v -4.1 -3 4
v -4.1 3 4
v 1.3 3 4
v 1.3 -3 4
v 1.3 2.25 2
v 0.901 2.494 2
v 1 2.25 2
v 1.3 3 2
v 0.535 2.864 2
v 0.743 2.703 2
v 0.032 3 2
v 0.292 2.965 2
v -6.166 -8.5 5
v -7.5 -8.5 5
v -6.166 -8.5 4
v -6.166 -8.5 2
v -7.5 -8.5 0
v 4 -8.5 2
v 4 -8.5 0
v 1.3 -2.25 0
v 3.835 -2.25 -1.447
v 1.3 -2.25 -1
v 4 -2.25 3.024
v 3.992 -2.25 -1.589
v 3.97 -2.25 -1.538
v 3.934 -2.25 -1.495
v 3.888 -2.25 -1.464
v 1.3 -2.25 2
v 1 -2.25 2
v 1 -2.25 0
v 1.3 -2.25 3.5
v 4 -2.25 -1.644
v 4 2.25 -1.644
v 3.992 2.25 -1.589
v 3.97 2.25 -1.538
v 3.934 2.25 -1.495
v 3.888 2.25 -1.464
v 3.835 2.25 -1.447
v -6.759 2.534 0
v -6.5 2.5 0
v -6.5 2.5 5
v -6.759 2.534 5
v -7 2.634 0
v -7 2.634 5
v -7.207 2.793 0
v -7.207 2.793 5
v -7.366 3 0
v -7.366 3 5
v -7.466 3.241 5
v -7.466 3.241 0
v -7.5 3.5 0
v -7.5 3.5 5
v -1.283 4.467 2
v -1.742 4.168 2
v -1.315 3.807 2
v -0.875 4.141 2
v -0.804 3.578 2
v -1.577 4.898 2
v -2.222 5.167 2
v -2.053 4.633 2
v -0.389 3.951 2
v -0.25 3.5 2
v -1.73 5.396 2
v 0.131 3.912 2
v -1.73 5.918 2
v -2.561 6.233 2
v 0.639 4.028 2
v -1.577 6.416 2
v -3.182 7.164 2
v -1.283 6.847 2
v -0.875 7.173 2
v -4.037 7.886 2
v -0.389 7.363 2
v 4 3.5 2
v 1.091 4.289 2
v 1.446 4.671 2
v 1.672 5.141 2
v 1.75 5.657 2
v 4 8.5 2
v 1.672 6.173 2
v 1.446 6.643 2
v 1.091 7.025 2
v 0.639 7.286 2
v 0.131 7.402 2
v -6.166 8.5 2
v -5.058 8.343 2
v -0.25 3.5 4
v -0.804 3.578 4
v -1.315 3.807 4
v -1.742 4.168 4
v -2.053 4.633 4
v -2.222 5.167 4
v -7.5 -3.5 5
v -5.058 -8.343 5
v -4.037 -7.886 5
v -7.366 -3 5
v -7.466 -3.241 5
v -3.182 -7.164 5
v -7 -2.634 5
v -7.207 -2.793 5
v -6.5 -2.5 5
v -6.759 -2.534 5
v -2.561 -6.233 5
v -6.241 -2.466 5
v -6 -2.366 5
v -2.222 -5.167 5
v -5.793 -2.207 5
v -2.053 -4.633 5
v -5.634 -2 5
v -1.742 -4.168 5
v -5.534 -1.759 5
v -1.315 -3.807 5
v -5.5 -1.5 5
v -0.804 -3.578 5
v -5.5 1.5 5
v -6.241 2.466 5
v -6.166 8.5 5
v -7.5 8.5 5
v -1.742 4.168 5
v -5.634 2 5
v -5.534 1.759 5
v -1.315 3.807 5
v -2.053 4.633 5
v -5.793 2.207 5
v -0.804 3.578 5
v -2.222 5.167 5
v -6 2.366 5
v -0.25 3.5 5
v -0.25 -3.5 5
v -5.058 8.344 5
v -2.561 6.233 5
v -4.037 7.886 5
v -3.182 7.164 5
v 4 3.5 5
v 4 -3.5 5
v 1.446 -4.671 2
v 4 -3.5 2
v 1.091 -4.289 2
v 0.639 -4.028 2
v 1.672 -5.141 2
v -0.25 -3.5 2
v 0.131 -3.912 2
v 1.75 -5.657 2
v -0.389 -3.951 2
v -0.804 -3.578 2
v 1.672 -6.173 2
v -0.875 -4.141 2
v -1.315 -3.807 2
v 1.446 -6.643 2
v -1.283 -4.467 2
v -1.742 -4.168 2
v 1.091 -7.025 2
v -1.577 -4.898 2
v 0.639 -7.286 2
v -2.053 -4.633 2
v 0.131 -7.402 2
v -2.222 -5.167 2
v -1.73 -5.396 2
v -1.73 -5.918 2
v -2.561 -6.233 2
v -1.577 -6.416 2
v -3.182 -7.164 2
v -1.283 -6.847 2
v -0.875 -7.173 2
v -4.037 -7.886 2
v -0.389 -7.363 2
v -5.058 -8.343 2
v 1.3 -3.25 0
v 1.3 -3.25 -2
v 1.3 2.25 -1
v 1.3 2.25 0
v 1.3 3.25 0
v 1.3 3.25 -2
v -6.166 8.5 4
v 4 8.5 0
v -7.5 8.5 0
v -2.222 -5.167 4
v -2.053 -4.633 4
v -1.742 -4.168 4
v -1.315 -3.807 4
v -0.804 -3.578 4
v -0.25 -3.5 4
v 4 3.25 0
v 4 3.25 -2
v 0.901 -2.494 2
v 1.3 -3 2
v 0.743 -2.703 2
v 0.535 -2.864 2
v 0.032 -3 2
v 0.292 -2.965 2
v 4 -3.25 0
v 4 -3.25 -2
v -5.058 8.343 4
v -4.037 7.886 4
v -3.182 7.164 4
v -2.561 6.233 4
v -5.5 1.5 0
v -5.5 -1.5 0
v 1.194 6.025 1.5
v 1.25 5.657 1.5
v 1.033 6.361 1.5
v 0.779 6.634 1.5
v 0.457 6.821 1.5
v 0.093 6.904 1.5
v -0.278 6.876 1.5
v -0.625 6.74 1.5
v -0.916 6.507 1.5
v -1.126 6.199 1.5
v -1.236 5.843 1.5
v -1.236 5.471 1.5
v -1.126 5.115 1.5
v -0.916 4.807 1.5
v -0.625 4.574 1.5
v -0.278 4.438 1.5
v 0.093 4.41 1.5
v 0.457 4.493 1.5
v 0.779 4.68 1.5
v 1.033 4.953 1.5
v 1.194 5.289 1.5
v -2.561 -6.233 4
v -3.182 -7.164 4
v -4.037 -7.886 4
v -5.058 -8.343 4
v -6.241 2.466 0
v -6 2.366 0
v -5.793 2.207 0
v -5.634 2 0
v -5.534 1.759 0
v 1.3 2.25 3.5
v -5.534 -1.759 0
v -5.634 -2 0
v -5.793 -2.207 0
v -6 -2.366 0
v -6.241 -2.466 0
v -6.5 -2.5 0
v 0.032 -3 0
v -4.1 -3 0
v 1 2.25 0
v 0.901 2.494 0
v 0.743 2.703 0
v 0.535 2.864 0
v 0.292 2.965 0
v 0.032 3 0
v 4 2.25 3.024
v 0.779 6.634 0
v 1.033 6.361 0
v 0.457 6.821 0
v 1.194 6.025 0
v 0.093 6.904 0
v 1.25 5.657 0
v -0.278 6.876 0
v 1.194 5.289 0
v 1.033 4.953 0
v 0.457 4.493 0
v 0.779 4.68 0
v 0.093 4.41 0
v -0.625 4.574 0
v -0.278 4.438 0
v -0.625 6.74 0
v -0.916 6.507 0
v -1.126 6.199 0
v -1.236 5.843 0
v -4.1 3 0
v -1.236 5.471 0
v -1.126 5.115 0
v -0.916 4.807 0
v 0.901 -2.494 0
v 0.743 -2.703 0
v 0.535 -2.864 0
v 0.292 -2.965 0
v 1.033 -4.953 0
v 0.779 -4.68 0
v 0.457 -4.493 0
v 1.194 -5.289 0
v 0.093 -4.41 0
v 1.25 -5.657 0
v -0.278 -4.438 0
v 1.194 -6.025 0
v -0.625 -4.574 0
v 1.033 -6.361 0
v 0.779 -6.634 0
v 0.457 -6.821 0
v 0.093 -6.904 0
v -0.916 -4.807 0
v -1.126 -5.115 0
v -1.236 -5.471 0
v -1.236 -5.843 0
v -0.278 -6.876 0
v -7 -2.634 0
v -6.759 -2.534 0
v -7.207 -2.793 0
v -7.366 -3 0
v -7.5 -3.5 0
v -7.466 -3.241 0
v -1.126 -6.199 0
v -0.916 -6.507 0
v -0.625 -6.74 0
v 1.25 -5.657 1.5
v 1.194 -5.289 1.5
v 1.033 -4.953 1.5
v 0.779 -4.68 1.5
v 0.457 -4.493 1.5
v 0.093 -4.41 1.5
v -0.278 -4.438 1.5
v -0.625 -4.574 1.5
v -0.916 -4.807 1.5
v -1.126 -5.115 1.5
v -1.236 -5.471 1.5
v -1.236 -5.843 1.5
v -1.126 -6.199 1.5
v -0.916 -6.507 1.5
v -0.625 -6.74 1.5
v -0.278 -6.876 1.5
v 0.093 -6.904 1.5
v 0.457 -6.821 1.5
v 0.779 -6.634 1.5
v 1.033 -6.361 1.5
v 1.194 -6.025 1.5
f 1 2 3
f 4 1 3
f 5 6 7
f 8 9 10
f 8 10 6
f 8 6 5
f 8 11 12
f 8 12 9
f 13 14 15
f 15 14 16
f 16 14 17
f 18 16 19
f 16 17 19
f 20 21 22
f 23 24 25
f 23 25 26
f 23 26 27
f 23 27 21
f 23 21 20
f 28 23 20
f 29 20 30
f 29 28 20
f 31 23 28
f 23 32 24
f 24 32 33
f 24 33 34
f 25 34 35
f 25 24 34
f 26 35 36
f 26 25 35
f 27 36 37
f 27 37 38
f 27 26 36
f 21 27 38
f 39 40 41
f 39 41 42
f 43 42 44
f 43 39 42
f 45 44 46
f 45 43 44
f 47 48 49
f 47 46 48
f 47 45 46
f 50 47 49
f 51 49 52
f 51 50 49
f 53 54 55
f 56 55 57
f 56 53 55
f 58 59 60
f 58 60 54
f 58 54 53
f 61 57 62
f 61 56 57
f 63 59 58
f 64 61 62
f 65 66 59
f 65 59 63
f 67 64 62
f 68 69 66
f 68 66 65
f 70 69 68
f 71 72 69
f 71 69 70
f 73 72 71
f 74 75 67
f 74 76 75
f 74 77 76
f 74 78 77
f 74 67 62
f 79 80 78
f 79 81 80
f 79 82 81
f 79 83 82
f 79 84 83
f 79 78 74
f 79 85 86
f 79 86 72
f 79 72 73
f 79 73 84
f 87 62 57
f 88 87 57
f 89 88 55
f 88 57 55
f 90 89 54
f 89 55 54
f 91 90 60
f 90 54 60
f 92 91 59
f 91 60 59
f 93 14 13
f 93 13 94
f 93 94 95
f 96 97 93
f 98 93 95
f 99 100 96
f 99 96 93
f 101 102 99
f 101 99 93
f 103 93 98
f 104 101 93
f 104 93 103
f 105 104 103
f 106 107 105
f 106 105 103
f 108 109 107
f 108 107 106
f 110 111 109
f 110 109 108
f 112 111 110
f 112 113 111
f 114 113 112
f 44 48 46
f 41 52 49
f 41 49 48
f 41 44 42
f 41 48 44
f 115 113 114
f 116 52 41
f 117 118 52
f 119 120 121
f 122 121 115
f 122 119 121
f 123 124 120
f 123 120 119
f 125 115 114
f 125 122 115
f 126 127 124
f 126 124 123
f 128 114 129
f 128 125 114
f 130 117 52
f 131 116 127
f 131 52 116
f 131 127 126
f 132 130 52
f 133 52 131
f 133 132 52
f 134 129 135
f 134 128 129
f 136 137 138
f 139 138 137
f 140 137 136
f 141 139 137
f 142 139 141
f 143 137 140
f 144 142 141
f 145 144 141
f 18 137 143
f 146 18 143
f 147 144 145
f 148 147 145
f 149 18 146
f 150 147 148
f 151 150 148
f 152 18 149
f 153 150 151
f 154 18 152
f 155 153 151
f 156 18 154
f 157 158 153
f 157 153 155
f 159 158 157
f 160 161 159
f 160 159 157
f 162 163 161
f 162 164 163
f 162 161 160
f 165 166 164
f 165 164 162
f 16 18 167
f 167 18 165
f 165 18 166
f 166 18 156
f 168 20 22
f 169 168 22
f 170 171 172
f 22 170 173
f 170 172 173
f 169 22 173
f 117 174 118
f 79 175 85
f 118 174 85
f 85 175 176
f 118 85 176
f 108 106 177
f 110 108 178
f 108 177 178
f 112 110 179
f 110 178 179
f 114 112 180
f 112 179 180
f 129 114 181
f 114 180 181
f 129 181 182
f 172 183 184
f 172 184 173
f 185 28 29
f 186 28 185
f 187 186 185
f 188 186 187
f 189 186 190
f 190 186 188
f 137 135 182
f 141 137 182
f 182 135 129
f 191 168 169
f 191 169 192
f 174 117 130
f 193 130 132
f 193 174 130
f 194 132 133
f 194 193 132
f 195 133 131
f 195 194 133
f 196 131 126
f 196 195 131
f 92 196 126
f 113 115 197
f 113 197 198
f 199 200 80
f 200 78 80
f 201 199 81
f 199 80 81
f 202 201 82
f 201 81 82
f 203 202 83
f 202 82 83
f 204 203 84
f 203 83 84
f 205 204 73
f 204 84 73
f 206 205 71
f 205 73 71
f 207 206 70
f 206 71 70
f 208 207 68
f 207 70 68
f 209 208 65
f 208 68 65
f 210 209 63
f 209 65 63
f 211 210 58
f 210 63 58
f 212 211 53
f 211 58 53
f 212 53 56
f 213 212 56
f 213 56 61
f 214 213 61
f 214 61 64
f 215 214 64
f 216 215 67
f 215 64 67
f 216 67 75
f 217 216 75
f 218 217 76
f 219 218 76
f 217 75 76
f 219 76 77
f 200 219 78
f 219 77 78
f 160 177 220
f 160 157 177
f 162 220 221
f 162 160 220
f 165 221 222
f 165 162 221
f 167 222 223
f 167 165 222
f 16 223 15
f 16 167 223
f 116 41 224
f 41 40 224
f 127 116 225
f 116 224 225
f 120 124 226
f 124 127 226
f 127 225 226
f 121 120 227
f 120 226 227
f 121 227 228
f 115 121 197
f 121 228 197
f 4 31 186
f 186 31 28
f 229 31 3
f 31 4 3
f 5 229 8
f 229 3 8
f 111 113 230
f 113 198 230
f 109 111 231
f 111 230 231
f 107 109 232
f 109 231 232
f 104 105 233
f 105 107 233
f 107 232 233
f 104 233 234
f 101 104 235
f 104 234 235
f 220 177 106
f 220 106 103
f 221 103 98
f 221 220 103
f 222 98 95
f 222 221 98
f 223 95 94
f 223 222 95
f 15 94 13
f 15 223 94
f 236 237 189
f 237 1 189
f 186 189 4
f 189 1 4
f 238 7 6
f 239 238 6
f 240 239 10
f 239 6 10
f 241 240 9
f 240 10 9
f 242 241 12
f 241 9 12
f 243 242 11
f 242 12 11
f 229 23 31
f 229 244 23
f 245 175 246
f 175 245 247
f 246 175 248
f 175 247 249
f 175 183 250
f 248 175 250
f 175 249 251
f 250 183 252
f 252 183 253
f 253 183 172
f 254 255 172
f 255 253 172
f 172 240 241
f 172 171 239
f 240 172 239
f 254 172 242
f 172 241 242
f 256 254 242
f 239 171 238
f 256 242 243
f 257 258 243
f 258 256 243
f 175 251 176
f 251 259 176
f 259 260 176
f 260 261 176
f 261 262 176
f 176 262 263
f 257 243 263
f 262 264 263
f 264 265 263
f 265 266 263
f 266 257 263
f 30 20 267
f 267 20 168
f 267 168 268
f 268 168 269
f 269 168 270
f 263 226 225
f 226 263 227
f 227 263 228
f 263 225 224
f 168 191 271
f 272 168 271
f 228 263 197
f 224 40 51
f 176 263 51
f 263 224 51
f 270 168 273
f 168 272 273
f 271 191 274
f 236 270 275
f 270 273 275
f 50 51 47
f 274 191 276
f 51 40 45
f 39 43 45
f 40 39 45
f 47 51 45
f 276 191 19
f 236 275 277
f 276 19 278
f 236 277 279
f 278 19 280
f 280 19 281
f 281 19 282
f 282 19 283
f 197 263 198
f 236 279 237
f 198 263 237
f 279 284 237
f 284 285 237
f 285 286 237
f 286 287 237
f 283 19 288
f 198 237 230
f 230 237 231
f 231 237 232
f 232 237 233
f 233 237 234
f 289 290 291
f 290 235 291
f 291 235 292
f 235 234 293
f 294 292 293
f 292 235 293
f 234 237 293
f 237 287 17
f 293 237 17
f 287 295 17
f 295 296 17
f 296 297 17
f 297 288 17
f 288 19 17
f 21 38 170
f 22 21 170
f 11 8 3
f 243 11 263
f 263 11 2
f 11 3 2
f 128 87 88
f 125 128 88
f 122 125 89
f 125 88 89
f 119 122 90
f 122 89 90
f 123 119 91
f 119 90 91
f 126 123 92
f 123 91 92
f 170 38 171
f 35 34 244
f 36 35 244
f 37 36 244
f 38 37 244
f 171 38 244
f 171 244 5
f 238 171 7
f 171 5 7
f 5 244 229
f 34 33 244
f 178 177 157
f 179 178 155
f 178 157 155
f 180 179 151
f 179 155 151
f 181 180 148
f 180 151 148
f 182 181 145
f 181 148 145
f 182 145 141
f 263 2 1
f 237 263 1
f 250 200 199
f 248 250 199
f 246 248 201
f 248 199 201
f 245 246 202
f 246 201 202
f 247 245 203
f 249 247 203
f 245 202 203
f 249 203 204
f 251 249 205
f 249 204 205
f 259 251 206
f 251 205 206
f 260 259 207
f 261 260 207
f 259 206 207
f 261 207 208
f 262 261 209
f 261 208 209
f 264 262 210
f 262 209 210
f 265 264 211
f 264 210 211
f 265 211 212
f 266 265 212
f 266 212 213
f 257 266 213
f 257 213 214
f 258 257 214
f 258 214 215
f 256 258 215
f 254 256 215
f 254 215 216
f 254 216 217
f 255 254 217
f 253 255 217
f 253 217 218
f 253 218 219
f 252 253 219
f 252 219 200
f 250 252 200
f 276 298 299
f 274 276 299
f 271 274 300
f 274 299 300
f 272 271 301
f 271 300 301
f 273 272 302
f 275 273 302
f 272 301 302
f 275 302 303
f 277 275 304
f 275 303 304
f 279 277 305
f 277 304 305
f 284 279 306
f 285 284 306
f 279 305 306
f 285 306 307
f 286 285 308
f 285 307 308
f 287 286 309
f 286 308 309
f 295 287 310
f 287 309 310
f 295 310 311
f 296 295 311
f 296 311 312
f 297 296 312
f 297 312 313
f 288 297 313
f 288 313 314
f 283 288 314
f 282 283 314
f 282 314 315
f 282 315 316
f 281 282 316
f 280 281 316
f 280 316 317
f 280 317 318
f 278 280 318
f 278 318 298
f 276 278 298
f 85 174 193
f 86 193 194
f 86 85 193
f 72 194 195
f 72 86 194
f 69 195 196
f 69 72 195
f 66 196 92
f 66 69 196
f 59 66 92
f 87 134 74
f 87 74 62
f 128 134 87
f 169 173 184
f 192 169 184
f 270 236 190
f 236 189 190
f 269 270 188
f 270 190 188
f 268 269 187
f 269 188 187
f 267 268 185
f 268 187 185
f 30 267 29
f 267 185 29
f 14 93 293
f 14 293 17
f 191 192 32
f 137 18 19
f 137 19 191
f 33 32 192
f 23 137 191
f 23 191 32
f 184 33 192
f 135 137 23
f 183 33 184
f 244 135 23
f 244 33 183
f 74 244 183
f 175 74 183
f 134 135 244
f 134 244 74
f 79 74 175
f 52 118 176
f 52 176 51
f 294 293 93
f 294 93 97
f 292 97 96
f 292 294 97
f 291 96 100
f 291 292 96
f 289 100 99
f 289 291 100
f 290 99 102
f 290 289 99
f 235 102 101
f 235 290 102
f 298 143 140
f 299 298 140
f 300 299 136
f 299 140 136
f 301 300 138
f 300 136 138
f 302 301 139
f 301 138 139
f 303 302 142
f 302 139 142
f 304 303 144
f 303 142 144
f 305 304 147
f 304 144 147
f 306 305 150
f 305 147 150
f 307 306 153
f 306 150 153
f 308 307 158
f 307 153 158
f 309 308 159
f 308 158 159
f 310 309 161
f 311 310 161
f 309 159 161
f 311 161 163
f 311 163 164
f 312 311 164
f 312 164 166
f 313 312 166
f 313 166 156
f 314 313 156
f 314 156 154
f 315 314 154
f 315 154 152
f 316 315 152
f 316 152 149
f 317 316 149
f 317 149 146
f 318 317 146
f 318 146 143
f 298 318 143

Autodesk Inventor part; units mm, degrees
ref_plane "YZ Plane" through (0, 0, 0) normal (1, 0, 0) x (0, 1, 0)
ref_plane "XZ Plane" through (0, 0, 0) normal (0, 1, 0) x (-1, 0, 0)
ref_plane "XY Plane" through (0, 0, 0) normal (0, 0, 1) x (1, 0, 0)
sketch "Boceto1" plane through (0, 0, 0) normal (0, 0, 1) x (1, 0, 0)
  line L0 (-4, 8.5) -> (4, 8.5)
  line L1 (4, 8.5) -> (4, -8.5)
  line L2 (4, -8.5) -> (-4, -8.5)
  line L3 (-4, -8.5) -> (-4, 8.5)
  line L4 (0, -11.9) -> (0, 11.9) projected
  line L5 (-5.6, 0) -> (5.6, 0) projected
  point P0 (0, 0)
  dimension "d0" = 8
  dimension "d1" = 17
extrude "Extrusión1" add sketch "Boceto1" along normal blind 2
sketch "Boceto2" plane through (0, 0, 2) normal (0, 0, 1) x (1, 0, 0)
  circle A0 centre (0, 5.657) radius 1.25
  circle A1 centre (0, -5.657) radius 1.25
  line L0 (4, 8.5) -> (-4, 8.5) projected
  line L1 (-4, -8.5) -> (4, -8.5) projected
  point P0 (0, 0)
  dimension "d4" = 2.5
  dimension "d7" = 2.5
  dimension "d18" = 0
  dimension "d19" = 0
  dimension "d37" = 5.657
  dimension "d38" = 5.657
extrude "Extrusión2" cut sketch "Boceto2" against normal up to surface (2 mm away)
chamfer "Chaflán1" distance 0.5 angle 45 2 edges at (-1.25, 5.657, 2) (-1.25, -5.657, 2)
sketch "Boceto6" plane through (0, 0, 2) normal (0, 0, 1) x (1, 0, 0)
  line L0 (4, 8.5) -> (-4, 8.5) projected
  line L1 (-4, -8.5) -> (4, -8.5) projected
  line L2 (-4, 8.5) -> (-2.25, 8.5)
  line L3 (-2.25, 8.5) -> (-2.25, -8.5)
  line L4 (-2.25, -8.5) -> (-4, -8.5)
  line L5 (-4, -8.5) -> (-4, 8.5)
  point P0 (0, 0)
  point P1 (-0.284, 8)
  dimension "d33" = 1.75
extrude "Extrusión6" add sketch "Boceto6" along normal blind 2
sketch "Boceto7" plane through (0, 0, 4) normal (0, 0, 1) x (1, 0, 0)
  line L0 (-4, 8.5) -> (-4, -8.5) projected
  line L1 (-4, 8.5) -> (-7.5, 8.5)
  line L2 (-7.5, 8.5) -> (-7.5, -8.5)
  line L3 (-7.5, -8.5) -> (-4, -8.5)
  line L4 (-4, -8.5) -> (-4, 8.5)
  line L5 (-9.2, 0) -> (6.2, 0) projected
  line L6 (-2.25, -8.5) -> (4, -8.5) projected
  point P0 (0, 0)
  dimension "d39" = 3.5
extrude "Extrusión7" add sketch "Boceto7" against normal up to surface (4 mm away)
sketch "Boceto8" plane through (0, 0, 4) normal (0, 0, 1) x (1, 0, 0)
  line L0 (4, -8.5) -> (4, 8.5) projected
  line L1 (4, 3) -> (-3, 3)
  line L2 (-3, 3) -> (-3, -3)
  line L3 (-3, -3) -> (4, -3)
  line L4 (4, -3) -> (4, 3)
  line L5 (-9.8, 0) -> (6.3, 0) projected
  point P0 (0, 0)
  dimension "d43" = 7
  dimension "d44" = 6
extrude "Extrusión8" cut sketch "Boceto8" against normal up to surface (4 mm away)
sketch "Boceto10" plane through (0, 0, 4) normal (0, 0, 1) x (1, 0, 0)
  line L0 (4, 3) -> (-3, 3) projected
  line L1 (-3, 3) -> (-4.1, 3)
  line L2 (-4.1, 3) -> (-4.1, -3)
  line L3 (-4.1, -3) -> (-3, -3)
  line L4 (-3, -3) -> (-3, 3)
  line L5 (-2.25, -3) -> (-3, -3) projected
  point P0 (0, 0)
  dimension "d51" = 1.1
extrude "Extrusión10" cut sketch "Boceto10" against normal up to surface (4 mm away)
sketch "Boceto11" plane through (0, 0, 2) normal (0, 0, 1) x (1, 0, 0)
  line L0 (4, 3) -> (4, 8.5) projected
  line L1 (4, 3) -> (1, 3)
  line L2 (1, 3) -> (1, 2.25)
  line L3 (1, 2.25) -> (4, 2.25)
  line L4 (4, 2.25) -> (4, 3)
  point P0 (0, 0)
  dimension "d54" = 3
  dimension "d55" = 0.75
extrude "Extrusión11" add sketch "Boceto11" against normal up to surface (2 mm away)
mirror "Simetría2" about plane through (0, 0, 0) normal (0, 1, 0) of "Extrusión11"
sketch "Boceto14" plane through (1, 2.25, 2) normal (0, -1, 0) x (1, 0, 0)
  line L0 (3, -2) -> (3, 0) projected
  line L1 (3, 0) -> (3, 1.0239)
  line L2 (3, -2) -> (-8.5, -2) projected
  line L3 (3, -2) -> (3, -3.9761)
  line L4 (0.3, -3.5) -> (0.3, 1.5)
  line L5 (3, -3.9761) -> (0.3, -3.5)
  line L6 (3, 1.0239) -> (0.3, 1.5)
  line L7 (3, -3.9761) -> (3, -3.4761)
  line L8 (3, -3.4761) -> (0.3, -3)
  line L9 (3, 1.0239) -> (3, 1.5239)
  line L10 (0.3, 1.5) -> (0.3, 2)
  line L11 (0.3, 2) -> (3, 1.5239)
  line L12 (-8.5, 2) -> (-3.25, 2) projected
  line L13 (3, 1.5239) -> (3, 2)
  line L14 (3, 2) -> (0.3, 2)
  line L15 (0.3, -3.5) -> (0.3, -4)
  line L16 (0.3, -3.5) -> (0.8, -3.5) construction
  line L17 (0.3, -4) -> (3, -4)
  line L18 (3, -4) -> (3, -3.9761)
  point P0 (-1, -2)
  point P1 (2.8356, -4)
  point P2 (0.3, -2)
  point P3 (-5, -2)
  dimension "d82" = 80
  dimension "d83" = 0.5
  dimension "d84" = 100
  dimension "d85" = 4.5
  dimension "d86" = 0.5
  dimension "d87" = 0.5
  dimension "d93" = 0
  dimension "d94" = 90
  dimension "d95" = 6
  dimension "d96" = 2.7
extrude "Extrusión13" add sketch "Boceto14" along normal up to surface (4.5 mm away) contours L3 L5 L4 L8 | L6 L10 L11 L9 | L18 L17 L15 L5 | L11 L14 L13
sketch "Boceto16" plane through (1.3, -2.25, 4) normal (0, -1, 0) x (1, 0, 0)
  line L0 (0, -0.5) -> (2.7, -0.9761) projected
  line L1 (2.7, -0.9761) -> (2.7, 0) projected
  line L2 (2.7, 0) -> (0, 0) projected
  line L3 (0, 0) -> (0, -0.5) projected
  line L4 (0, -6) -> (2.7, -6) projected
  line L5 (2.7, -0.9761) -> (2.7, 0) projected
  line L6 (0, -6) -> (2.7, -6)
  line L7 (2.7, -6) -> (2.7, 0)
  line L8 (2.7, 0) -> (0, 0)
  line L9 (0, 0) -> (0, -6)
  line L10 (2.7, -6) -> (2.7, -5.4761) projected
  line L11 (0, -5) -> (0, -6) projected
  line L12 (2.7, -5.4761) -> (0, -5) projected
  line L13 (0, 0) -> (0, -0.5) projected
  point P0 (-1.3, -4)
  point P1 (2.7, -0.9761)
  point P2 (2.7, -6)
  point P3 (2.7, -6)
  point P4 (2.7, -5.4761)
  point P5 (3, -5.529)
extrude "Extrusión15" add sketch "Boceto16" along normal blind 1
mirror "Simetría4" about plane through (0, 0, 0) normal (0, 1, 0) of "Extrusión15"
fillet "Empalme6" radius 0.2 1 edges at (4, 0, -1.4761)
sketch "Boceto18" plane through (0, 0, 4) normal (0, 0, 1) x (1, 0, 0)
  line L0 (-2.25, -8.5) -> (-2.25, -3) projected
  line L1 (4, 2.25) -> (4, -8.5) projected
  line L2 (-2.25, -3) -> (4, -3)
  line L3 (4, -3) -> (4, -3.5)
  line L4 (4, -3.5) -> (-2.25, -3.5)
  line L5 (-2.25, -3.5) -> (-2.25, -3)
  line L6 (-2.25, 3) -> (1, 3) projected
  line L7 (4, 2.25) -> (4, 8.5) projected
  line L8 (-2.25, 3) -> (4, 3)
  line L9 (4, 3) -> (4, 3.5)
  line L10 (4, 3.5) -> (-2.25, 3.5)
  line L11 (-2.25, 3.5) -> (-2.25, 3)
  point P0 (0, 0)
  point P1 (4, -3.25)
  point P2 (4, 3.25)
  point P3 (-2.25, -3.5)
  point P4 (4, -3)
  point P5 (1, 3)
  point P6 (4, 3)
  point P7 (4, -3)
  dimension "d102" = 0.5
  dimension "d103" = 0.5
extrude "Extrusión16" add sketch "Boceto18" against normal up to surface (2 mm away)
fillet "Empalme7" radius 2 2 edges at (-2.25, -3.5, 3) (-2.25, 3.5, 3)
fillet "Empalme8" radius 1 2 edges at (1, 3, 1) (1, -3, 1)
fillet "Empalme9" radius 4 2 edges at (-2.25, 8.5, 3) (-2.25, -8.5, 3)
sketch "Boceto19" plane through (0, 0, 4) normal (0, 0, 1) x (1, 0, 0)
  line L0 (-4.1, -3) -> (1.3, -3) projected
  line L1 (-4.1, -3) -> (-4.1, 3) projected
  line L2 (-4.1, 3) -> (1.3, 3) projected
  line L3 (1.3, 3) -> (1.3, -3) projected
  arc A0 (-6.1661, -8.5) -> (-2.222, -5.1667) centre (-6.1661, -4.5) ccw projected
  arc A1 (-0.25, -3.5) -> (-2.222, -5.1667) centre (-0.25, -5.5) ccw projected
  line L4 (4, -3.5) -> (-0.25, -3.5) projected
  line L5 (4, 3.5) -> (4, -3.5) projected
  line L6 (4, 3.5) -> (-0.25, 3.5) projected
  arc A2 (-2.222, 5.1667) -> (-0.25, 3.5) centre (-0.25, 5.5) ccw projected
  arc A3 (-2.222, 5.1667) -> (-6.1661, 8.5) centre (-6.1661, 4.5) ccw projected
  line L7 (-7.5, 8.5) -> (-7.5, -8.5) projected
  line L8 (-6.1661, 8.5) -> (-7.5, 8.5) projected
  line L9 (-7.5, -8.5) -> (-6.1661, -8.5) projected
  point P0 (0, 0)
extrude "Extrusión17" add sketch "Boceto19" along normal blind 1 contours L1 L2 L3 L0 | L9 L7 L8 A3 A2 L6 L5 L4 A1 A0
sketch "Boceto20" plane through (0, 0, 5) normal (0, 0, 1) x (1, 0, 0)
  line L0 (-7.5, -8.5) -> (-7.5, 8.5) projected
  line L1 (-7.5, 2.5) -> (-5.5, 2.5)
  line L2 (-5.5, 2.5) -> (-5.5, -2.5)
  line L3 (-5.5, -2.5) -> (-7.5, -2.5)
  line L4 (-7.5, -2.5) -> (-7.5, 2.5)
  line L5 (-9.8, 0) -> (6.3, 0) projected
  point P0 (0, 0)
  dimension "d111" = 2
  dimension "d112" = 5
extrude "Extrusión18" cut sketch "Boceto20" against normal up to surface (5 mm away)
fillet "Empalme10" radius 1 4 edges at (-7.5, 2.5, 2.5) (-7.5, -2.5, 2.5) (-5.5, 2.5, 2.5) (-5.5, -2.5, 2.5)
equation "\"d4\" = d7"
equation "\"d38\" = d37"
equation "\"d86\" = d83"
equation "\"d87\" = d86"
properties part number "Soporte Hot End Sensor"
